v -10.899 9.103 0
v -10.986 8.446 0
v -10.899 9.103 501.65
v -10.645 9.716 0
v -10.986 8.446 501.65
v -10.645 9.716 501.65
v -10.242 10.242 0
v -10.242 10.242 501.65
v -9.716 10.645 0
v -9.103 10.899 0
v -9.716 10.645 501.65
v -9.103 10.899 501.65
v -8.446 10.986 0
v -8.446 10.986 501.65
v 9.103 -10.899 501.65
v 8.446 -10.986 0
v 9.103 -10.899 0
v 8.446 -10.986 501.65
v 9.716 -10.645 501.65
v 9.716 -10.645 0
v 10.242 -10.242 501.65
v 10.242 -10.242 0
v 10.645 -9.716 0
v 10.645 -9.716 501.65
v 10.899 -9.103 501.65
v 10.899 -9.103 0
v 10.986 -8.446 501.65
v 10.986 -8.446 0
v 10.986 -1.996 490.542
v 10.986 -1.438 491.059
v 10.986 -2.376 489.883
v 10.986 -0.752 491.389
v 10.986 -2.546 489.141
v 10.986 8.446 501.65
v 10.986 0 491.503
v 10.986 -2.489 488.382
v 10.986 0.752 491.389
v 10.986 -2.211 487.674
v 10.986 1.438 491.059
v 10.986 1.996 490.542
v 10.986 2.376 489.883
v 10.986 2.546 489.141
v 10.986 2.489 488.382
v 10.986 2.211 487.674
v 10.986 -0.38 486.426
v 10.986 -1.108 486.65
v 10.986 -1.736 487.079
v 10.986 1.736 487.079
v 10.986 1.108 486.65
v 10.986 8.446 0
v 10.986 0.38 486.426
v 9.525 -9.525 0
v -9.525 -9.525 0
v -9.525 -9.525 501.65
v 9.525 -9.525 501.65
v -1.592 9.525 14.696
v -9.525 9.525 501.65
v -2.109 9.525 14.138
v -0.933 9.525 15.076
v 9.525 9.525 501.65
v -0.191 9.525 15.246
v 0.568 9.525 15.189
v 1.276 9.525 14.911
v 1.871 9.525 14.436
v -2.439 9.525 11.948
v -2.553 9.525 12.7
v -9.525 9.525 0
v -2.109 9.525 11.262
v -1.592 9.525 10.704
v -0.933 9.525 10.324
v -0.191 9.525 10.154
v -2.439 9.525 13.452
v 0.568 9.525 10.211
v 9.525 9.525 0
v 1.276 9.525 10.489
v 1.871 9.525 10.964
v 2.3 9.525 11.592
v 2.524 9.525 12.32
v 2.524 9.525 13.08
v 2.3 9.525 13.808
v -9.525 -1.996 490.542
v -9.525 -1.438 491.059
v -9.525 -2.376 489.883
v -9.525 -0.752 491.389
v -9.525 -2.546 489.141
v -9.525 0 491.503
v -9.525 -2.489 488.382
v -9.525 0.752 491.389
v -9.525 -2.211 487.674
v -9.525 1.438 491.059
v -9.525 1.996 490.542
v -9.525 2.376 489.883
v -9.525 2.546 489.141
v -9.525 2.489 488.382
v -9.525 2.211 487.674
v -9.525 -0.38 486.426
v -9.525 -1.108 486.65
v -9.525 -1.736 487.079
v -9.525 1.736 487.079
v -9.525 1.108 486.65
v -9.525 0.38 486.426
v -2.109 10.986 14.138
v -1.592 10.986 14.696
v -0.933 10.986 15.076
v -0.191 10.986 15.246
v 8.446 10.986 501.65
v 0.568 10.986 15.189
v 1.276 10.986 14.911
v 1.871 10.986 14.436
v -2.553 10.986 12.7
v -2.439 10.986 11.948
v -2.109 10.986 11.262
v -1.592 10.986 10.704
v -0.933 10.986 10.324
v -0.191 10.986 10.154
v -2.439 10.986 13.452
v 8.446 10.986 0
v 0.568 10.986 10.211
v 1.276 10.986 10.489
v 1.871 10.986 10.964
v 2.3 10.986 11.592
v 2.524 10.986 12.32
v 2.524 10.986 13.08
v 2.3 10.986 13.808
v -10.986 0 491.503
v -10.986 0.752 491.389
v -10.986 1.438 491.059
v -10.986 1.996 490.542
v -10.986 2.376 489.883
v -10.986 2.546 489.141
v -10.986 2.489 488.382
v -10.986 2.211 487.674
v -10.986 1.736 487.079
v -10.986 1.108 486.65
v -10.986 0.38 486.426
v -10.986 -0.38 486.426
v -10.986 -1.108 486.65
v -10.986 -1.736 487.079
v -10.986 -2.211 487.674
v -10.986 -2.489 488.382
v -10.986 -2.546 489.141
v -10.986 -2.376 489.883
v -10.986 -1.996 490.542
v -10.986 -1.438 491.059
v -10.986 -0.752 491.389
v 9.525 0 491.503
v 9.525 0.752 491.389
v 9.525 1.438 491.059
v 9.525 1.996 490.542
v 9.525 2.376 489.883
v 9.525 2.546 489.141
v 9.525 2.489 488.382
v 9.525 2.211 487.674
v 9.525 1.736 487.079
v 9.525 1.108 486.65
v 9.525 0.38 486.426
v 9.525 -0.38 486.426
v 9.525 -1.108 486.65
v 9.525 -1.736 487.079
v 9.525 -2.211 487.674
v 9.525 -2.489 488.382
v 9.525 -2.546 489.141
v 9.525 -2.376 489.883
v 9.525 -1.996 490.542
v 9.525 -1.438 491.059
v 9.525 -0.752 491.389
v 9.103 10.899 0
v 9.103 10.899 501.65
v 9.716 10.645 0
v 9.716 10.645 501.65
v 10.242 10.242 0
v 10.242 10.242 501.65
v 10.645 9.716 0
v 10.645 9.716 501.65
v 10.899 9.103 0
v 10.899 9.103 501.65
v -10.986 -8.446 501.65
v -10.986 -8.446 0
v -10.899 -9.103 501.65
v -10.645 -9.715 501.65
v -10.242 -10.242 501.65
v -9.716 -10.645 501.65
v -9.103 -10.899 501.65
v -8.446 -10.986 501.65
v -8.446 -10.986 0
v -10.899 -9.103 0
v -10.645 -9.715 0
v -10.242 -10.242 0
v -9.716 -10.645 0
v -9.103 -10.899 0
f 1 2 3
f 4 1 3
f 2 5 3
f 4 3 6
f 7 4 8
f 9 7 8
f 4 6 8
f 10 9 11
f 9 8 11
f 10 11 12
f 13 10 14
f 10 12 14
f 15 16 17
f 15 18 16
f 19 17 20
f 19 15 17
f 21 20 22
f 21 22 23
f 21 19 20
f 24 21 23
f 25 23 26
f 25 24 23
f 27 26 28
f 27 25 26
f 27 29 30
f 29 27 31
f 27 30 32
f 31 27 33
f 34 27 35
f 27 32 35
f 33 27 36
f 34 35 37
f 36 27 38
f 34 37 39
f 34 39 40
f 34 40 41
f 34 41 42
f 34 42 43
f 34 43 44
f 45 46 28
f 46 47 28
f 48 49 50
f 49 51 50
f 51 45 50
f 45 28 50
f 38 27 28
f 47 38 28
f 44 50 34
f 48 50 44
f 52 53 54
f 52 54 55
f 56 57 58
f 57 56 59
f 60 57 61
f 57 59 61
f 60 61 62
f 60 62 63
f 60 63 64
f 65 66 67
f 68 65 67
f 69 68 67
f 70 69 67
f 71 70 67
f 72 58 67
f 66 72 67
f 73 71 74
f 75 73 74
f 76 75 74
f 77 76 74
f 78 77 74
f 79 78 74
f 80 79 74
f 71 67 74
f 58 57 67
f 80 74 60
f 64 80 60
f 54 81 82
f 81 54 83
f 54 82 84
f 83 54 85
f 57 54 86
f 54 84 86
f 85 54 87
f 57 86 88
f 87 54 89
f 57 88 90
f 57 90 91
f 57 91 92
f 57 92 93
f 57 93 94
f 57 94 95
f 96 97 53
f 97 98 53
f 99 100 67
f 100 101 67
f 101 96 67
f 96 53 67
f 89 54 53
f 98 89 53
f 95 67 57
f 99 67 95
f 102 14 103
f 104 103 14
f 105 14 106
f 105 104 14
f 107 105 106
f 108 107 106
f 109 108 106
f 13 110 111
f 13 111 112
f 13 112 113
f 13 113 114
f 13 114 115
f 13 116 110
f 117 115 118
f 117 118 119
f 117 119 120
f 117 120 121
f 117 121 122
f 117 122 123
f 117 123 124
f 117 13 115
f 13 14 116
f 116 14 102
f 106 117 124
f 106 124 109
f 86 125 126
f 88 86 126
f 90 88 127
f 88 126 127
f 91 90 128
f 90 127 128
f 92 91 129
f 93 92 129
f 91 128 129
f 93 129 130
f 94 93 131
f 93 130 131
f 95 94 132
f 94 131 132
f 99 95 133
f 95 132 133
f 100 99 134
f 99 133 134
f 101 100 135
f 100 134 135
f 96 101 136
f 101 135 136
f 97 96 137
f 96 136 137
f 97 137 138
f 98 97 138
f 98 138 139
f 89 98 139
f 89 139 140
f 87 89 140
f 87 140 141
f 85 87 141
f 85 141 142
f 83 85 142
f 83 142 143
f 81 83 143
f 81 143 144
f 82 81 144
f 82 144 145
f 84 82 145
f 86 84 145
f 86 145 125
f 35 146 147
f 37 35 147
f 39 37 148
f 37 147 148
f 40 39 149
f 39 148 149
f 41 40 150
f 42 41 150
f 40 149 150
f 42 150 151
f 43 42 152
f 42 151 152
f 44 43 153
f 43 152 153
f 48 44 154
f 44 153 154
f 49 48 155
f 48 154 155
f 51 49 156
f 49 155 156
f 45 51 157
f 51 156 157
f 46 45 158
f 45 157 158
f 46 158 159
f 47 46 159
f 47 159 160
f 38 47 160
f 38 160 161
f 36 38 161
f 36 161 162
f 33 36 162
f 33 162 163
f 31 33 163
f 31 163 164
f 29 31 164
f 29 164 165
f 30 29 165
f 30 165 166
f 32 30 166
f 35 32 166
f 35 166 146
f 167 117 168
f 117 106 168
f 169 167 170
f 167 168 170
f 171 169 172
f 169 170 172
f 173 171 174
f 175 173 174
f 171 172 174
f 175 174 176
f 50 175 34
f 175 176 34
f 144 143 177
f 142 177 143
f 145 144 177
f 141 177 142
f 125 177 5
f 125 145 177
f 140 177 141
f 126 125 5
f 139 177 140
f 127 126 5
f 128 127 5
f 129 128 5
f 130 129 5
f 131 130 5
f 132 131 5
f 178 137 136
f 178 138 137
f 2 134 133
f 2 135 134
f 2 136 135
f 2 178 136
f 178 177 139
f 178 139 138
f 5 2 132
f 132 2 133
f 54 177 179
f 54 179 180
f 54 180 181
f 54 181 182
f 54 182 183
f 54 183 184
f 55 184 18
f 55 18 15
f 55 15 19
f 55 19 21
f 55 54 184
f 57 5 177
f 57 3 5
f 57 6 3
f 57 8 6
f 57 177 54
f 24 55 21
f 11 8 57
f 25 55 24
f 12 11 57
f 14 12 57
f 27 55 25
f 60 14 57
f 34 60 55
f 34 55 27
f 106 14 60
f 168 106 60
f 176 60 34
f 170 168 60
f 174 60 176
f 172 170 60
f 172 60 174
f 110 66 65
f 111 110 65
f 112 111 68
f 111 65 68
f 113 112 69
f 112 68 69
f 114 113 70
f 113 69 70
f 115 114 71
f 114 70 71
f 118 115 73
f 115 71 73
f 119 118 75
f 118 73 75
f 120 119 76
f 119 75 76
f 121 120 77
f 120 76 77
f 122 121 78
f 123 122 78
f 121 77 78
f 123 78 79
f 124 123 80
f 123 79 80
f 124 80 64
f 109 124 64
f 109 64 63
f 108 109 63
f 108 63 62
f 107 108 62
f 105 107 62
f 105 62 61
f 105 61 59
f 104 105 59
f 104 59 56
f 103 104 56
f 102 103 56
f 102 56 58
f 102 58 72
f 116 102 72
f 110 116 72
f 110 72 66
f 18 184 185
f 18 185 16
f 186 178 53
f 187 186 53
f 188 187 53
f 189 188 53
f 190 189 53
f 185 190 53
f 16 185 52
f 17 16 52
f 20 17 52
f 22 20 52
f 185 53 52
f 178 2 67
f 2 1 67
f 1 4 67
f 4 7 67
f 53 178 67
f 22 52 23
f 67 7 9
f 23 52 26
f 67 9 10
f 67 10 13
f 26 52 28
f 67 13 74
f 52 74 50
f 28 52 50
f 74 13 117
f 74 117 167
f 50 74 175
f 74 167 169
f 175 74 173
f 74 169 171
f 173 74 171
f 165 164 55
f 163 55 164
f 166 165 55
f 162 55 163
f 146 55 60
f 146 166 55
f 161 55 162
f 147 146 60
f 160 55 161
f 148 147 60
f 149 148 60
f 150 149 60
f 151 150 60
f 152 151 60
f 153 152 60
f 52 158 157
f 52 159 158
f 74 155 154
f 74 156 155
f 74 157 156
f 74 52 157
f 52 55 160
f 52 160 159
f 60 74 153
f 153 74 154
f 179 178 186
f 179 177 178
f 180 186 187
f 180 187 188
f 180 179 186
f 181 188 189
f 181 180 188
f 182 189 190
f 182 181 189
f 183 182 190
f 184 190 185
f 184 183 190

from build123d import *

# Parameters (mm, degrees)
SKETCH4_W                  = 21.971
SKETCH4_H                  = 21.971
SKETCH4_W_2                = 19.05
SKETCH4_H_2                = 19.05
BOSS_EXTRUDE2_DEPTH        = 501.65
FILLET1_R                  = 2.54
F_10_CLEARANCE_HOLE1_D     = 5.1054
F_10_CLEARANCE_HOLE1_DEPTH = 16.51
F_10_CLEARANCE_HOLE1_TIP   = 1.533816902
F_10_CLEARANCE_HOLE2_D     = 5.1054


with BuildPart() as part:
    # Sketch4 → Boss-Extrude2 (new body)
    with BuildSketch(Plane.XY):
        Rectangle(SKETCH4_W, SKETCH4_H)
        Rectangle(SKETCH4_W_2, SKETCH4_H_2, mode=Mode.SUBTRACT)
    extrude(amount=BOSS_EXTRUDE2_DEPTH)

    # Fillet1
    fillet1_edges = [part.edges().sort_by_distance(p)[0] for p in [
        (-10.9855, 10.9855, 250.825),
        (10.9855, 10.9855, 250.825),
        (10.9855, -10.9855, 250.825),
        (-10.9855, -10.9855, 250.825),
    ]]
    fillet(fillet1_edges, radius=FILLET1_R)

    # #10 Clearance Hole1
    with Locations(Plane(origin=(0, 10.9855, 0), x_dir=(1, 0, 0), z_dir=(0, 1, 0))):
        with Locations((0, -12.7)):
            Hole(F_10_CLEARANCE_HOLE1_D / 2, depth=F_10_CLEARANCE_HOLE1_DEPTH)
            with Locations((0, 0, -(F_10_CLEARANCE_HOLE1_DEPTH + F_10_CLEARANCE_HOLE1_TIP / 2))):  # 118° drill point
                Cone(0, F_10_CLEARANCE_HOLE1_D / 2, F_10_CLEARANCE_HOLE1_TIP, mode=Mode.SUBTRACT)

    # #10 Clearance Hole2 (through all)
    with Locations(Plane(origin=(10.9855, 0, 0), x_dir=(0, 0, -1), z_dir=(1, 0, 0))):
        with Locations((-488.95, 0)):
            Hole(F_10_CLEARANCE_HOLE2_D / 2)


solid = part.part
